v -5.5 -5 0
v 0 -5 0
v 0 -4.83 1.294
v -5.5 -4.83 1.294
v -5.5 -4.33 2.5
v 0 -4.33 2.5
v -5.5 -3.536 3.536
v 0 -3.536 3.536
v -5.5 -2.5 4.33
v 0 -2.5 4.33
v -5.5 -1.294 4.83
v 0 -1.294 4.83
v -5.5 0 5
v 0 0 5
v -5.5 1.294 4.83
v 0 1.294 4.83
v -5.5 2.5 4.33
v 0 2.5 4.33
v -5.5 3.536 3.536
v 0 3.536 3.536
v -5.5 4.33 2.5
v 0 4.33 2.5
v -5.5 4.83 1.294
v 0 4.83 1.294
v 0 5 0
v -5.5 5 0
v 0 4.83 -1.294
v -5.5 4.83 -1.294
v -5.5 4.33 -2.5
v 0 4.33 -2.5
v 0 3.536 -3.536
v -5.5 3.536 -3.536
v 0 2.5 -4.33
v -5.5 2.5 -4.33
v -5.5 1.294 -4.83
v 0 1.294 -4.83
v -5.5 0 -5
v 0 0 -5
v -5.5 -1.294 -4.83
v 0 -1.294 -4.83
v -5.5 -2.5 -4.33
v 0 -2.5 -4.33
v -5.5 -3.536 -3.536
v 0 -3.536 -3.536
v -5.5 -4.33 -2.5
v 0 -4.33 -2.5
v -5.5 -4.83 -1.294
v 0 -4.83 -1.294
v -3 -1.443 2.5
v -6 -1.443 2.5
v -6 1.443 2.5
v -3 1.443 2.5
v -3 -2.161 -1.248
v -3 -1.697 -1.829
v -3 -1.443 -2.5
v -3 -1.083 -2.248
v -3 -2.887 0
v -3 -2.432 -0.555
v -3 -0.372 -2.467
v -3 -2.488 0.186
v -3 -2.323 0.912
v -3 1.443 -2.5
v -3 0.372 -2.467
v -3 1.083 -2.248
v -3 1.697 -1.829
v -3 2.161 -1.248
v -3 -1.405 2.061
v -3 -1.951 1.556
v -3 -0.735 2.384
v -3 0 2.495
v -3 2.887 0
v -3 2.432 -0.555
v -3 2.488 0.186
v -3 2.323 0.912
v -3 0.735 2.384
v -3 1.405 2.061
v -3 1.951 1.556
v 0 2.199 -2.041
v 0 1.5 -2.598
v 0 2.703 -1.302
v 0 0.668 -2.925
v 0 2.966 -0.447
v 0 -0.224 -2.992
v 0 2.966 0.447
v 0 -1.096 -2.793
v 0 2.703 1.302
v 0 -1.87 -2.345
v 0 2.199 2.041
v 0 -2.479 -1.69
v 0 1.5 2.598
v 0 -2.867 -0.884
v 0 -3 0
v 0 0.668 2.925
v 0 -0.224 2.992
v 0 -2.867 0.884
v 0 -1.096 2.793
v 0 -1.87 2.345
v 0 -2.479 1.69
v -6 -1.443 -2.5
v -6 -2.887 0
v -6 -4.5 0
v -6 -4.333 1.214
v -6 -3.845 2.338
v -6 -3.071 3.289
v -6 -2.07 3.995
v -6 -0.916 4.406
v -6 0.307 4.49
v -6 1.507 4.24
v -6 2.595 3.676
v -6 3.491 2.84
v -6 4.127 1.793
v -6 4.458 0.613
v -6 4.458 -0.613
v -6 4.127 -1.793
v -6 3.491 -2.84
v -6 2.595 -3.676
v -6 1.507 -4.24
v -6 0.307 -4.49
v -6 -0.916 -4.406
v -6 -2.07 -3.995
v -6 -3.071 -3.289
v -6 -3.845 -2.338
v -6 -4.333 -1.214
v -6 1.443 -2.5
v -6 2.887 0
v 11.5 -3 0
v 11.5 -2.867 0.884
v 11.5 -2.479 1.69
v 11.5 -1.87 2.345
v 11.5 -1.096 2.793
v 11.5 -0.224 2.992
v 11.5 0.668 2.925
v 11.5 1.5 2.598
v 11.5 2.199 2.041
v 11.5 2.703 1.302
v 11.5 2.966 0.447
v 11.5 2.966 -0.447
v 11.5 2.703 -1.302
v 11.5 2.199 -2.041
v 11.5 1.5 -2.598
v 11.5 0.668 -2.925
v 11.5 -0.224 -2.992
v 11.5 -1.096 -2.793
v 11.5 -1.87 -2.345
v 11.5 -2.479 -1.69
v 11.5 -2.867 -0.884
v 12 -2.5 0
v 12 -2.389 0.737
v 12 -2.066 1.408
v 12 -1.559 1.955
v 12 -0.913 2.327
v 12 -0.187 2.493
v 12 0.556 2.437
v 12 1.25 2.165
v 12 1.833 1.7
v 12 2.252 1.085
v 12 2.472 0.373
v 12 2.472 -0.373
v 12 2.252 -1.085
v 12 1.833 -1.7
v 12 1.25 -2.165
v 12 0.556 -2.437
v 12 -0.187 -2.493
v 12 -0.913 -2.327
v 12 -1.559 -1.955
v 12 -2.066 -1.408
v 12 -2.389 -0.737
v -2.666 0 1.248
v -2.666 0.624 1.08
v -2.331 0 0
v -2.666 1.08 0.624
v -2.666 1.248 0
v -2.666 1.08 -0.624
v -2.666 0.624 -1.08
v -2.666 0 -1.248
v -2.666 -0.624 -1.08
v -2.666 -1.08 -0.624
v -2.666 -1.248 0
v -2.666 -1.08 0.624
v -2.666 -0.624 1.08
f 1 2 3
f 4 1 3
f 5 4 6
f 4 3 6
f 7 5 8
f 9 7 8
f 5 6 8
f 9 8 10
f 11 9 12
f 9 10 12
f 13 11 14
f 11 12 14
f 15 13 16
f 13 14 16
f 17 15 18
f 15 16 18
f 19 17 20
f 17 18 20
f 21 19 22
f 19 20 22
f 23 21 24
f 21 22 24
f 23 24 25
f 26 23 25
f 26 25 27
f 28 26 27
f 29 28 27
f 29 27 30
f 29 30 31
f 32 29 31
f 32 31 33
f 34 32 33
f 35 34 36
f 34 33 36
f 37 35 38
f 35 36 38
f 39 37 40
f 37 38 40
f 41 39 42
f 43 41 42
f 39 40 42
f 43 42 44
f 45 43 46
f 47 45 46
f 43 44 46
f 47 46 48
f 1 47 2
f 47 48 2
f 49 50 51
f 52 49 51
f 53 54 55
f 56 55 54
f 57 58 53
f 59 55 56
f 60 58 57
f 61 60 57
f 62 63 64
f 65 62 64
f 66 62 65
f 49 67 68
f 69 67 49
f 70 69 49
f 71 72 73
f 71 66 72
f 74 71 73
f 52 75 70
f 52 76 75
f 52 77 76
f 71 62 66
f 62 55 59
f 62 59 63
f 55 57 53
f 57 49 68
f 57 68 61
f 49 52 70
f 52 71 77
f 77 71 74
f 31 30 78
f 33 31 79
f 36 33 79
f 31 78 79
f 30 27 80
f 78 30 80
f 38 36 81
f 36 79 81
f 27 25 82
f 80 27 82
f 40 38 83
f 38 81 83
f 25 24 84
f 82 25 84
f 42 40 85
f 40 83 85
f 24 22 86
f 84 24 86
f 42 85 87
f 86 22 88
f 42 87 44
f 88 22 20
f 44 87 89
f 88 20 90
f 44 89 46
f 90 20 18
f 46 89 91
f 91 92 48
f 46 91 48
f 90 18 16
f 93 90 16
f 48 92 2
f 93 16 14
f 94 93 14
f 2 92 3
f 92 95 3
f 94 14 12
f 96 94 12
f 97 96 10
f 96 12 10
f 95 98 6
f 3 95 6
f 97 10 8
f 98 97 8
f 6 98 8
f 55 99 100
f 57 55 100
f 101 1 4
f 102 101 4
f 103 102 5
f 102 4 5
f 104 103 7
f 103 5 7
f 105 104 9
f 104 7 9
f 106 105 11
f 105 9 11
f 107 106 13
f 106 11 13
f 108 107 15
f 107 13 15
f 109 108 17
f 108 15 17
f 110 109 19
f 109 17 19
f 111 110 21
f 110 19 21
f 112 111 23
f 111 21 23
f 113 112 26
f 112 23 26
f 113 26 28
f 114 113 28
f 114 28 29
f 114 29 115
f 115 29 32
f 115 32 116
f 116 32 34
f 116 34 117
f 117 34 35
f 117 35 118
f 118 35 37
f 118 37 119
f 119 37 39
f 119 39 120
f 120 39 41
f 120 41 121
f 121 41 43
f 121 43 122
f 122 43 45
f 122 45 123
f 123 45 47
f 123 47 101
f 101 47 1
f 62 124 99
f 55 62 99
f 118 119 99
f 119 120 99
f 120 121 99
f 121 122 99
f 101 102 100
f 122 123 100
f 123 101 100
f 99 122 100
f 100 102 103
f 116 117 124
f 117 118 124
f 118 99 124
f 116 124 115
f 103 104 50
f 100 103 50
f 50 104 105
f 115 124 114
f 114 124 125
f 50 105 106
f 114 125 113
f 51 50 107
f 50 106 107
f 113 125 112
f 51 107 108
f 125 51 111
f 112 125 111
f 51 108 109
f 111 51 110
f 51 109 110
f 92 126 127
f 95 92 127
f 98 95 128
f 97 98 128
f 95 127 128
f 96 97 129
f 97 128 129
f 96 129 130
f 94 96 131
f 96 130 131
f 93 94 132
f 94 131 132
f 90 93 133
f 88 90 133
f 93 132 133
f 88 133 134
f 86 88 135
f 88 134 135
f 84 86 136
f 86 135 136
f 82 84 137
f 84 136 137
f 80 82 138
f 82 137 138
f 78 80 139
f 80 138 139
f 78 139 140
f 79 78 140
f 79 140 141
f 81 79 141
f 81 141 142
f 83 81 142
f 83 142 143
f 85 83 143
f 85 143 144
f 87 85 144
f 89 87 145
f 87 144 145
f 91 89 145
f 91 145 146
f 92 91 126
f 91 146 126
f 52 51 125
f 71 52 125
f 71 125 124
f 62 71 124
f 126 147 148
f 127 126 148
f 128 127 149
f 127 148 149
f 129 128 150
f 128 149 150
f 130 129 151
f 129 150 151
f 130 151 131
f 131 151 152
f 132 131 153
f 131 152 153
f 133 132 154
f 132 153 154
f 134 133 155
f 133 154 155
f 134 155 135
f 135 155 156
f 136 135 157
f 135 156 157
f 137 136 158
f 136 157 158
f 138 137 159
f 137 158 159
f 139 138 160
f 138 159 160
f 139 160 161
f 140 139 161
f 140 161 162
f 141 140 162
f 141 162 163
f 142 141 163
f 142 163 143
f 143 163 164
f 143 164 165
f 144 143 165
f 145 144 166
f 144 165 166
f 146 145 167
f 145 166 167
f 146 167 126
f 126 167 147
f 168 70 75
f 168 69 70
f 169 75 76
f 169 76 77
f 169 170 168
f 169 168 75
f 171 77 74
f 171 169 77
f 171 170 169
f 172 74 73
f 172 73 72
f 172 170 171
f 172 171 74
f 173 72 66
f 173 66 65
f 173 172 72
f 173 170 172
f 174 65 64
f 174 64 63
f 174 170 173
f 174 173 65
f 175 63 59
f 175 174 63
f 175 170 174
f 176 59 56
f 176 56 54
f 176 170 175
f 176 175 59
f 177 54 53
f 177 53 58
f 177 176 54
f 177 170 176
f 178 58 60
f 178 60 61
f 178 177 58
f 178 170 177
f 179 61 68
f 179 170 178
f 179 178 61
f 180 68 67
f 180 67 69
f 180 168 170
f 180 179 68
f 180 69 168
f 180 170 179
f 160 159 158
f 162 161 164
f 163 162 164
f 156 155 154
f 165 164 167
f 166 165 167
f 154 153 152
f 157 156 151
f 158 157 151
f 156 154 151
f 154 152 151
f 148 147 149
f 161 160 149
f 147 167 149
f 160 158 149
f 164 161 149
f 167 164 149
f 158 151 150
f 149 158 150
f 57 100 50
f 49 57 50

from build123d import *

# Parameters (mm, degrees)
CUT_EXTRUDE1_DEPTH = 3
CHAMFER1_SIZE      = 0.5


with BuildPart() as part:
    # Sketch1 → Revolve1 (revolve)
    with BuildSketch(Plane.XY, mode=Mode.PRIVATE) as revolve1_sk:
        Polygon((-6, 0), (-6, 5), (0, 5), (0, 3), (12, 3), (12, 0), align=None)
    revolve(revolve1_sk.sketch.rotate(Axis((12, 0, 0), (-1, 0, 0)), 180), axis=Axis((12, 0, 0), (-1, 0, 0)))

    # Sketch2 → Cut-Revolve1 (revolve, cut)
    with BuildSketch(Plane.XY, mode=Mode.PRIVATE) as cut_revolve1_sk:
        Polygon((-6, 0), (-6, 2.495), (-3, 2.495), (-2.331466765, 0), align=None)
    revolve(cut_revolve1_sk.sketch.rotate(Axis((-2.331466765, 0, 0), (-1, 0, 0)), 270), axis=Axis((-2.331466765, 0, 0), (-1, 0, 0)), mode=Mode.SUBTRACT)

    # Sketch3 → Cut-Extrude1 (cut)
    with BuildSketch(Plane.ZY.offset(6)):
        Polygon((0, 2.886751346), (-2.5, 1.443375673), (-2.5, -1.443375673), (0, -2.886751346), (2.5, -1.443375673), (2.5, 1.443375673), align=None)
    extrude(amount=-CUT_EXTRUDE1_DEPTH, mode=Mode.SUBTRACT)

    # Chamfer1
    chamfer1_edges = [part.edges().sort_by_distance(p)[0] for p in [
        (12, 3, 0),
        (-6, 5, 0),
    ]]
    chamfer(chamfer1_edges, length=CHAMFER1_SIZE)


solid = part.part
